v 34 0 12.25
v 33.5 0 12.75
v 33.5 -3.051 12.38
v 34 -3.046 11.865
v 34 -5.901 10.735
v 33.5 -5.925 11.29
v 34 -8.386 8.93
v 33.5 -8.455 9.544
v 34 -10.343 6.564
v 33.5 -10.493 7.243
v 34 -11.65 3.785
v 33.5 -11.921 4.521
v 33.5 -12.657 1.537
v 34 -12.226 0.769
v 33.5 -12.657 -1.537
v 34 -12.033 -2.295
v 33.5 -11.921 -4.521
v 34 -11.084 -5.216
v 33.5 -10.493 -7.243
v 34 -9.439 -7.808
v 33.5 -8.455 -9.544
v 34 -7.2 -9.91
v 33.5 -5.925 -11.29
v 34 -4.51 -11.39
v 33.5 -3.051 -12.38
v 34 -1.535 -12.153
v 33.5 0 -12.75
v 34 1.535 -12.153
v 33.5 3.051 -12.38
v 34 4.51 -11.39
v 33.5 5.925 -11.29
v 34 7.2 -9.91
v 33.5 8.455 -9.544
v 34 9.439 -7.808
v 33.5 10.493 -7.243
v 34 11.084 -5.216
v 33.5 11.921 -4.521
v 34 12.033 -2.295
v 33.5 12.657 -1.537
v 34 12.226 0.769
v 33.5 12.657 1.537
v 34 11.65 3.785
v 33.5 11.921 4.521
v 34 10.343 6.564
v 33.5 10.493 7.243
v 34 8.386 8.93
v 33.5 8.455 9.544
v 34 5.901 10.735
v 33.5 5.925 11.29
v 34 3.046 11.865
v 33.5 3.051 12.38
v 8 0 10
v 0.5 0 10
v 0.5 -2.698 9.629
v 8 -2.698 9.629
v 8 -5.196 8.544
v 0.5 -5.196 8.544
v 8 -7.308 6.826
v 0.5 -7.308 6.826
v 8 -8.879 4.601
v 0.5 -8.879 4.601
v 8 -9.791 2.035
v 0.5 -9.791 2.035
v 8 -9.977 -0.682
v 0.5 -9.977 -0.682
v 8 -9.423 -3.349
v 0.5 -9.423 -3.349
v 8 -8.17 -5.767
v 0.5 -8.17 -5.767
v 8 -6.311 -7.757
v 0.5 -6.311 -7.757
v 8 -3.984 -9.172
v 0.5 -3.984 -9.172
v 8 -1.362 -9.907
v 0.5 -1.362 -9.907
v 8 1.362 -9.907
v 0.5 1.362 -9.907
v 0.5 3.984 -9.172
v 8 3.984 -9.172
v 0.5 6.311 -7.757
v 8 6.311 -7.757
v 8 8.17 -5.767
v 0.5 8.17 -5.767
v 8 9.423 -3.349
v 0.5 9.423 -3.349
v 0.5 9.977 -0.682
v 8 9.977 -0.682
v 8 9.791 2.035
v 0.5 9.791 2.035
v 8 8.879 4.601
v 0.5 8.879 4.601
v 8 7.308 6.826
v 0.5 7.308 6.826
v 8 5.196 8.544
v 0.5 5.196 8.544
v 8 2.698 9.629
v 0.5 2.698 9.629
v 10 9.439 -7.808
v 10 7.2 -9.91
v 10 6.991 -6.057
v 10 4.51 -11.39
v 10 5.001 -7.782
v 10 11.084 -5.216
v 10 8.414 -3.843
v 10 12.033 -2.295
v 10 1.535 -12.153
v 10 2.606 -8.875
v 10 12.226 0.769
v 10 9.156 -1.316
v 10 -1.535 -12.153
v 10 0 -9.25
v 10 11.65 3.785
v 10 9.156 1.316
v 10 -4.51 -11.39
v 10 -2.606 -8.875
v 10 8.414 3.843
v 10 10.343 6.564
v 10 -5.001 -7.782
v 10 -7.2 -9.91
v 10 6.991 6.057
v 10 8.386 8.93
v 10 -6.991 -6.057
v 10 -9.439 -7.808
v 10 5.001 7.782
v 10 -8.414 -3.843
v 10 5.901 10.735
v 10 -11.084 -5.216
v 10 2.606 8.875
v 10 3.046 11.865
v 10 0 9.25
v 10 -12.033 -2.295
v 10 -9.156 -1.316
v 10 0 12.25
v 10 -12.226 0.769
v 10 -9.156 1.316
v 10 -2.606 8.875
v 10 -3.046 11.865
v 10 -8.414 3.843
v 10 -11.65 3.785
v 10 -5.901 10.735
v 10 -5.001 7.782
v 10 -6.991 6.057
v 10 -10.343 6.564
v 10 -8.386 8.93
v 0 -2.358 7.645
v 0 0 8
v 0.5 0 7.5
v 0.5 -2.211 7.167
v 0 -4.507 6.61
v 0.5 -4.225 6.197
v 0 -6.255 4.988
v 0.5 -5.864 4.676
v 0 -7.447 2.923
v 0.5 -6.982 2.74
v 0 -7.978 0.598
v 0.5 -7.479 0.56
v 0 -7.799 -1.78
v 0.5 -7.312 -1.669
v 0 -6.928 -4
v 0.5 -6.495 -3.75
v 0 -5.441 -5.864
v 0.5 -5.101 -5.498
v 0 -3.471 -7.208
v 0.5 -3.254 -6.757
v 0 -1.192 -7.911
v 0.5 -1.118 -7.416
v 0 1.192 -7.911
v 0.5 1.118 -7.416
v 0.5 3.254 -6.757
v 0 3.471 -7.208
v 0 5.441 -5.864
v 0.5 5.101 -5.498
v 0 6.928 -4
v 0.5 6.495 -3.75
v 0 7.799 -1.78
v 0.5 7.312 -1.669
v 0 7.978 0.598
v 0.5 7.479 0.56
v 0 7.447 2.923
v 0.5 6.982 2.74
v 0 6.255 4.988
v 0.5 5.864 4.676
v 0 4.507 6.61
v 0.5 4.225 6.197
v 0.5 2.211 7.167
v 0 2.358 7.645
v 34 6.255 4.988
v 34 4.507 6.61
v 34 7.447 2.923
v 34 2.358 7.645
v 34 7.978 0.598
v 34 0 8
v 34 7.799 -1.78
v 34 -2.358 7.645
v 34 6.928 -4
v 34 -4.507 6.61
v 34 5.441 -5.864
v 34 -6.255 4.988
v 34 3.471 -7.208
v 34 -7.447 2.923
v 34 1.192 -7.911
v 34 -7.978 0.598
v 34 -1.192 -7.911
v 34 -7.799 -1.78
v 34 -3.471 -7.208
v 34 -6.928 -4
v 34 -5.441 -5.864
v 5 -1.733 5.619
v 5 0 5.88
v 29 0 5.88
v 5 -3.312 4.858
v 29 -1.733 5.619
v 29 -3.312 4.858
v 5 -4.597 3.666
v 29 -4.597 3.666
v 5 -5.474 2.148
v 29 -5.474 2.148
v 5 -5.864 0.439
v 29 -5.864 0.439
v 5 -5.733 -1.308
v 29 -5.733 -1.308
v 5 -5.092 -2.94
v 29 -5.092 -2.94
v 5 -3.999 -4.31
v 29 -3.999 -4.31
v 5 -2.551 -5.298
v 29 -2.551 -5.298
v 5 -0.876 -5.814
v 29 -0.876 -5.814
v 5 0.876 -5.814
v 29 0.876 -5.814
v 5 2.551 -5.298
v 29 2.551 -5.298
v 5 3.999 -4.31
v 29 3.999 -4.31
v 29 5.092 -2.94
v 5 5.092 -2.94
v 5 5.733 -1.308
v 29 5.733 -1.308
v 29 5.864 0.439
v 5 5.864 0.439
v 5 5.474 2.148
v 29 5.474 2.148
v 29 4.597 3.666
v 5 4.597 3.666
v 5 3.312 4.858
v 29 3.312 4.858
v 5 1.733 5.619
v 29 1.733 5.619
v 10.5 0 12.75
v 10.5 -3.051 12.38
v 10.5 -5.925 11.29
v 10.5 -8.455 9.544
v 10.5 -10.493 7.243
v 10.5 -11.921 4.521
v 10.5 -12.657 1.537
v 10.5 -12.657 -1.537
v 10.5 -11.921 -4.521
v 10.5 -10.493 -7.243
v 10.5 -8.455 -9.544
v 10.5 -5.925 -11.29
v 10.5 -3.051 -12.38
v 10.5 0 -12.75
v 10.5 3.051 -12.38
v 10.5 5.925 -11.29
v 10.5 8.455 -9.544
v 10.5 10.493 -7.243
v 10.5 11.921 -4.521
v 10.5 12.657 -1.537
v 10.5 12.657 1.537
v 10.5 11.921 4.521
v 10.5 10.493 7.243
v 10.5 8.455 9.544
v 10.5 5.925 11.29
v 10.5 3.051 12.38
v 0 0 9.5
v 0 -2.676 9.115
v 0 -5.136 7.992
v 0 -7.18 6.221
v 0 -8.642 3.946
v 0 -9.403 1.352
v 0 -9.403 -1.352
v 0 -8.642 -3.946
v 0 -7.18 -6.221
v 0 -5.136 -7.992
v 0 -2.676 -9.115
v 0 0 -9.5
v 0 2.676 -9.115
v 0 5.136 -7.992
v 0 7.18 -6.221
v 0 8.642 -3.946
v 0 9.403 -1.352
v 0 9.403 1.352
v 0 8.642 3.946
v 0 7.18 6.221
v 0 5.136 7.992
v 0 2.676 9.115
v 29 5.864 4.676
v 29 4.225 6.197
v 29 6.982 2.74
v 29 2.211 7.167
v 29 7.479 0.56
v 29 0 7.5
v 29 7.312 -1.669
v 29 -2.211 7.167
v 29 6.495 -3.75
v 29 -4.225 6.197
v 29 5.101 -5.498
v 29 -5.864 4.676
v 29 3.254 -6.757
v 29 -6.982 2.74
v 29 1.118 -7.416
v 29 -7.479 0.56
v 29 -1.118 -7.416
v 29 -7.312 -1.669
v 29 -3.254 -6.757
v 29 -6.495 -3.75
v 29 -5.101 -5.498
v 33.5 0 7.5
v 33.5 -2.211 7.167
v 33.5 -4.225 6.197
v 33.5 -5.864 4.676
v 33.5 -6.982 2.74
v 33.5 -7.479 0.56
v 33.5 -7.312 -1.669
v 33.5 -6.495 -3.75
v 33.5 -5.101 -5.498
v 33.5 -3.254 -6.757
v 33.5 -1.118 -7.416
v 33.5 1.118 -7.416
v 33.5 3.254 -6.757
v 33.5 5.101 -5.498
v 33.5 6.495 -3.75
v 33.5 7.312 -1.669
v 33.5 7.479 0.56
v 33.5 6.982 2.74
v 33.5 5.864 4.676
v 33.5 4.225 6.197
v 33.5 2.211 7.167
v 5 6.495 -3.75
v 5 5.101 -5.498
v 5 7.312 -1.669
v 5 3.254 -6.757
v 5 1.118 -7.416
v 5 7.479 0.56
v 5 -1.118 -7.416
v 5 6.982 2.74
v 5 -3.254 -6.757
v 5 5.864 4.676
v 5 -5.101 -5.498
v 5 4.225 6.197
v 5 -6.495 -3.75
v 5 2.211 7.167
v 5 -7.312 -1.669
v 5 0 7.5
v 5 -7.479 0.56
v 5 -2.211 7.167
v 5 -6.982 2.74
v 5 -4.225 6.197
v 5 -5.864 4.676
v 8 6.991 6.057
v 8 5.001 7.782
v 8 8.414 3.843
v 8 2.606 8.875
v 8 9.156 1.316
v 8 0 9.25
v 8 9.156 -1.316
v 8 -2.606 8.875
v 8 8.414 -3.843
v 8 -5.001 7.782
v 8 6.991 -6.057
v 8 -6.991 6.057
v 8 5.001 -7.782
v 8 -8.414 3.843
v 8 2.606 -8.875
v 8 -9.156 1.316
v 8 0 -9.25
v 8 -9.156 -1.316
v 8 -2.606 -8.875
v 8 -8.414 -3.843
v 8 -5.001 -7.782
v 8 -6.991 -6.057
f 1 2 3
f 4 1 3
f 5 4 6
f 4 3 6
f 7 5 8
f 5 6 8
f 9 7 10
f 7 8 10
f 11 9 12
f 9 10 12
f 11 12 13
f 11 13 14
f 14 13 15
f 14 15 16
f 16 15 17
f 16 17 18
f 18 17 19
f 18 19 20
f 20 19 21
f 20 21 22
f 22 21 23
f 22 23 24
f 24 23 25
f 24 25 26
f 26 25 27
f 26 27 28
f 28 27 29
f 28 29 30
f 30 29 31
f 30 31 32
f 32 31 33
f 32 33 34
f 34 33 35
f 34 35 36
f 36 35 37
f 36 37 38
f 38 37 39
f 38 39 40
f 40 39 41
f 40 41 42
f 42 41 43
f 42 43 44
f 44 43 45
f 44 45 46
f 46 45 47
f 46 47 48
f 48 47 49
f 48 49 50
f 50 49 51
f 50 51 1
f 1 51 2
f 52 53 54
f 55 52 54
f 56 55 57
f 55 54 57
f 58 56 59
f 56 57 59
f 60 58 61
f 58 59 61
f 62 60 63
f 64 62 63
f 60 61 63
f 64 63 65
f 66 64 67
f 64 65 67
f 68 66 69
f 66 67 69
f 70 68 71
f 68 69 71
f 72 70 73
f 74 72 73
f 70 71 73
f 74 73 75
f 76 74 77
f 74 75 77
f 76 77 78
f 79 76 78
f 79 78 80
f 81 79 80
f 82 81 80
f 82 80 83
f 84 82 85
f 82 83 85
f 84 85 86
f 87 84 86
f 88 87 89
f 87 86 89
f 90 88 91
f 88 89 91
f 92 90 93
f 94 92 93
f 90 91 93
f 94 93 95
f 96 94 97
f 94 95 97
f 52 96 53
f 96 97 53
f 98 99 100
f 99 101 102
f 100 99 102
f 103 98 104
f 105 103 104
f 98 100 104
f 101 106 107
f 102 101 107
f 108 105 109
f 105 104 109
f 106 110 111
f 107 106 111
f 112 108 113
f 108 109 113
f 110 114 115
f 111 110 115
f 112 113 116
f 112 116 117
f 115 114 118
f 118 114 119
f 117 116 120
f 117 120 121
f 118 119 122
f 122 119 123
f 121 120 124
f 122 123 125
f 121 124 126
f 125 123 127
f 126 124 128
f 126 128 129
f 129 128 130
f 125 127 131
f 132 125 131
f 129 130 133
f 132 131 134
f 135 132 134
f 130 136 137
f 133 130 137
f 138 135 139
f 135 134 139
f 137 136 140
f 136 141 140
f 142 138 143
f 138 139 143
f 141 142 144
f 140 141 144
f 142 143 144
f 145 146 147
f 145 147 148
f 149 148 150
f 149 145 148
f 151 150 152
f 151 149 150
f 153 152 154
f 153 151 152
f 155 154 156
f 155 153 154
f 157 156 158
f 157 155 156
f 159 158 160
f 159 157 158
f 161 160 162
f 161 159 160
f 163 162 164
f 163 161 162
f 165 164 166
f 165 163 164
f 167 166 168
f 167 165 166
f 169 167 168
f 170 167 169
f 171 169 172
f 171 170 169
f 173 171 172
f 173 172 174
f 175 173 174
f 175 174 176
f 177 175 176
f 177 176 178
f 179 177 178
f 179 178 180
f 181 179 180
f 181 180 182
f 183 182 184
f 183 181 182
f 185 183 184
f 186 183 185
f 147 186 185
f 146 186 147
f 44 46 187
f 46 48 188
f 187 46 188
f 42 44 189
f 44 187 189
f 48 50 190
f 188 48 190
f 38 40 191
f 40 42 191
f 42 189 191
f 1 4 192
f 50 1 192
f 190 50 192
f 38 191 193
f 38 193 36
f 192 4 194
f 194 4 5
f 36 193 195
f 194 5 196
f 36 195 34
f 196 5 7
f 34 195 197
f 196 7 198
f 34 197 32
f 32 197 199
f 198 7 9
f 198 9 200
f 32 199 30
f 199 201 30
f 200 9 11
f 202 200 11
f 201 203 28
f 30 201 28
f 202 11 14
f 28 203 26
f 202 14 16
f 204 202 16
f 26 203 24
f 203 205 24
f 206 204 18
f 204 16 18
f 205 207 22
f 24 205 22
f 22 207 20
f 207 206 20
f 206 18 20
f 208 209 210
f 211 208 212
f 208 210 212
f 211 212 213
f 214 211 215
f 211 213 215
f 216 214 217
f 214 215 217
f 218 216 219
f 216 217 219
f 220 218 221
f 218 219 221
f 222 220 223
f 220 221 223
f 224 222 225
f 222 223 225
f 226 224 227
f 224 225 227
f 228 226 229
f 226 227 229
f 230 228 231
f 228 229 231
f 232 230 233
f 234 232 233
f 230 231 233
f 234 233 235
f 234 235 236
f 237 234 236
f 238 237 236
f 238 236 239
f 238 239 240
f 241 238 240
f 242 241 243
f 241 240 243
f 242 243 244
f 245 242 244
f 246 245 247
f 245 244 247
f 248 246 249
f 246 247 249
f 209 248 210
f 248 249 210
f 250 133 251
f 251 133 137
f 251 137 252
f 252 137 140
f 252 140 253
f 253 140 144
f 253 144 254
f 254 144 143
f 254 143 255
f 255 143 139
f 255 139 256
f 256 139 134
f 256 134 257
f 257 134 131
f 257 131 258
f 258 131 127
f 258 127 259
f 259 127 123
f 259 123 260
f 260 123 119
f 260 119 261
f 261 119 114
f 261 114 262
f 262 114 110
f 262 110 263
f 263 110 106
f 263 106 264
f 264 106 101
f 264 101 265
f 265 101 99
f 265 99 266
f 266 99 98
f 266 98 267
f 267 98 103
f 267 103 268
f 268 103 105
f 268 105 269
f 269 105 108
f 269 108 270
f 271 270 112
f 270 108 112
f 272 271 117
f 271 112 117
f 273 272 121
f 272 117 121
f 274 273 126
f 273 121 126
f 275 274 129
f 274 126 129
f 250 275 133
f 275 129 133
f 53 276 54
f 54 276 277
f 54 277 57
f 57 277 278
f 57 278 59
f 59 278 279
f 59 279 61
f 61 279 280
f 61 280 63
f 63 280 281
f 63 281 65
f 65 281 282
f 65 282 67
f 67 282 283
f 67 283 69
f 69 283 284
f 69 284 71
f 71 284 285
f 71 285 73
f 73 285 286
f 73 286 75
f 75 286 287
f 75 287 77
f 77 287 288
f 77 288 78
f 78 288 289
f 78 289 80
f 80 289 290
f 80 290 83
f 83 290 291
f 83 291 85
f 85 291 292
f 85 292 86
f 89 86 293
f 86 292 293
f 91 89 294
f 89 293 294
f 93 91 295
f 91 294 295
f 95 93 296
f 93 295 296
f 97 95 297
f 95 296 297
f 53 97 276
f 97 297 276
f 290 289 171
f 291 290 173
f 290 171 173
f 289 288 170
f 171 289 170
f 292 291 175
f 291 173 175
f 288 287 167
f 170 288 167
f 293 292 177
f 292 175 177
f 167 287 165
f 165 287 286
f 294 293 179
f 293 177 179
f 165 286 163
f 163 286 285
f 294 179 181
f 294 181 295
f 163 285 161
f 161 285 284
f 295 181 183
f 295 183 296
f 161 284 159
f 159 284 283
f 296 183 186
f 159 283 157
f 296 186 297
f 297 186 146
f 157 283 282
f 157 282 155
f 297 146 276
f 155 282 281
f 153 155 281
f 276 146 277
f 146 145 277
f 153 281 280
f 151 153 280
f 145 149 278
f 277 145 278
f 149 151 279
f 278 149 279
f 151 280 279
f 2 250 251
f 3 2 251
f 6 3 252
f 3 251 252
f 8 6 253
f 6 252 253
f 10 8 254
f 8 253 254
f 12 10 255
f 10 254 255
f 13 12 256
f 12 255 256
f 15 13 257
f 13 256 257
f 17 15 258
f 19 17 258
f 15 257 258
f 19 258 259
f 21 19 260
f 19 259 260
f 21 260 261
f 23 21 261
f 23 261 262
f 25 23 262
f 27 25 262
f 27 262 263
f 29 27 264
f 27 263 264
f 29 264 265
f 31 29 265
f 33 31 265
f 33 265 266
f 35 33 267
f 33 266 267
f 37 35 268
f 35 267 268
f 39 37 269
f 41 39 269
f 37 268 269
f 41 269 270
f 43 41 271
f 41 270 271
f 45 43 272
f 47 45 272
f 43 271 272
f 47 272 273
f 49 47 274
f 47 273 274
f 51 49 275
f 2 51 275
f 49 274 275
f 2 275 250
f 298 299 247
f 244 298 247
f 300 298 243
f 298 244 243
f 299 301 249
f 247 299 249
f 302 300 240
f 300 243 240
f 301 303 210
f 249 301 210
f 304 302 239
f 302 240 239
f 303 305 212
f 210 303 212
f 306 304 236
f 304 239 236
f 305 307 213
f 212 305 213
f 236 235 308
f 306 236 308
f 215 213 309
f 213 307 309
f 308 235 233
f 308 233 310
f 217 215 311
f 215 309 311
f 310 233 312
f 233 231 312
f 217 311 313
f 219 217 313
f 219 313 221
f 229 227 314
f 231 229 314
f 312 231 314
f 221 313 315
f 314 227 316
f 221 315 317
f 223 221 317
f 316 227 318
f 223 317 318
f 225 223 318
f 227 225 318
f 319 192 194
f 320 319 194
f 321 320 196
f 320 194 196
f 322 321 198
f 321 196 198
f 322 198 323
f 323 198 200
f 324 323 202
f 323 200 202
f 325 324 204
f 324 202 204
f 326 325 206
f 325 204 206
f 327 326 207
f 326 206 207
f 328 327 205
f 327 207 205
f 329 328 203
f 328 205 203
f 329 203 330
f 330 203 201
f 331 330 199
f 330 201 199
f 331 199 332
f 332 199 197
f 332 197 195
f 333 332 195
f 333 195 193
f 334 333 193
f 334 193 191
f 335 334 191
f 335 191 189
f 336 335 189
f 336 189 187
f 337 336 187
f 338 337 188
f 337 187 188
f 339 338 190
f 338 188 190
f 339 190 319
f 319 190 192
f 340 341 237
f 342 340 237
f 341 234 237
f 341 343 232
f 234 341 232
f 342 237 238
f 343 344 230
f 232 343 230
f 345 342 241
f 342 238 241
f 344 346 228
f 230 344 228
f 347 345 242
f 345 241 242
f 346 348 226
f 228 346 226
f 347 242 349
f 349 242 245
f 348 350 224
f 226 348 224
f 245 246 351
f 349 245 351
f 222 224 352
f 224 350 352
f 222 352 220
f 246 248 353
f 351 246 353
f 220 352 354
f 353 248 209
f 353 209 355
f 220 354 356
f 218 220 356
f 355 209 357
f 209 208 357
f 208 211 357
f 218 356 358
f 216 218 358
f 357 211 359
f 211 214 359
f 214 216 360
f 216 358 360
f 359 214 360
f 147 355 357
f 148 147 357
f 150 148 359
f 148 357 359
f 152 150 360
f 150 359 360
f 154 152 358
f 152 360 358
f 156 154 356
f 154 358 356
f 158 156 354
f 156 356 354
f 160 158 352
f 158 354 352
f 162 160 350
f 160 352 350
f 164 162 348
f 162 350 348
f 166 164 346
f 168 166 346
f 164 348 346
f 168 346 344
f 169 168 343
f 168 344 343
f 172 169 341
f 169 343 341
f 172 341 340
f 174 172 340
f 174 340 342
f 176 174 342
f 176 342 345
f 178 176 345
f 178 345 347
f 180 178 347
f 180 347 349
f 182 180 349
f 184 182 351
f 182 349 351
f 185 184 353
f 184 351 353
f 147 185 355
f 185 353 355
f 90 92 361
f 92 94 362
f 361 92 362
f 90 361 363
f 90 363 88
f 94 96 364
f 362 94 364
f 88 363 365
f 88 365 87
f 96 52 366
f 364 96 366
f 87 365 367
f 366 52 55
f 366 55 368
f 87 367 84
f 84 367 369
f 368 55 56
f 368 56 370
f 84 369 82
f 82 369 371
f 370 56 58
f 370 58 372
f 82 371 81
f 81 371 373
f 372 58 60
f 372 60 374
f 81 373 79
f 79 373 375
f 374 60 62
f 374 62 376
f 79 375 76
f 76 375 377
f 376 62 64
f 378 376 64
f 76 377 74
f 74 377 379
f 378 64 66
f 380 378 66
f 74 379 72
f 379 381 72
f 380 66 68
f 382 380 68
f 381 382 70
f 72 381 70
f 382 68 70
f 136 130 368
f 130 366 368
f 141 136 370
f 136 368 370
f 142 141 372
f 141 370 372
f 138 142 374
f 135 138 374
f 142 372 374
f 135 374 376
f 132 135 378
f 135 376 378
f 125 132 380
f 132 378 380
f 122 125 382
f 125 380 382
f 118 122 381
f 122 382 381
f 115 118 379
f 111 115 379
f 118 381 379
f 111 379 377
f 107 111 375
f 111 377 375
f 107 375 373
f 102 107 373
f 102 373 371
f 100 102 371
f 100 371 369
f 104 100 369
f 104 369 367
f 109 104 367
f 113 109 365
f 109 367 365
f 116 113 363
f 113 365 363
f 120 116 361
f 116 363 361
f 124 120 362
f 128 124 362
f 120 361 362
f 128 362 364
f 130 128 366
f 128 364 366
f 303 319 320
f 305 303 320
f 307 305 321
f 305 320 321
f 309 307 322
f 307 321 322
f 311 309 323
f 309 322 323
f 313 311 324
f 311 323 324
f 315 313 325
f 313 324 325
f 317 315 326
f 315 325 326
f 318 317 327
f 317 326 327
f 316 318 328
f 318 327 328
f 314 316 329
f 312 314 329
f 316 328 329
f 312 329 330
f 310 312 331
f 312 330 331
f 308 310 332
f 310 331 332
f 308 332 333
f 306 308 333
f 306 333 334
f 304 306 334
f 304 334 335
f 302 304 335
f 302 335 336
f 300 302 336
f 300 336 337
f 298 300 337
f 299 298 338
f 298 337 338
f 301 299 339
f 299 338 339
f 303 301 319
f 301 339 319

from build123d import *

# Parameters (mm, degrees)
CHANFREIN1_SIZE = 0.5


with BuildPart() as part:
    # Esquisse1 → Base-Révolution (revolve)
    with BuildSketch(Plane.XY, mode=Mode.PRIVATE) as base_r_volution_sk:
        Polygon((0, 7.5), (5, 7.5), (5, 5.88), (29, 5.88), (29, 7.5), (34, 7.5), (34, 12.75), (10, 12.75), (10, 9.25), (8, 9.25), (8, 10), (0, 10), align=None)
    revolve(base_r_volution_sk.sketch.rotate(Axis((0, 0, 0), (1, 0, 0)), 90), axis=Axis((0, 0, 0), (1, 0, 0)))

    # Chanfrein1
    chanfrein1_edges = [part.edges().sort_by_distance(p)[0] for p in [
        (10, 0, -12.75),
        (0, 0, -10),
        (0, 0, -7.5),
        (34, 0, -7.5),
        (34, 0, -12.75),
    ]]
    chamfer(chanfrein1_edges, length=CHANFREIN1_SIZE)


solid = part.part
